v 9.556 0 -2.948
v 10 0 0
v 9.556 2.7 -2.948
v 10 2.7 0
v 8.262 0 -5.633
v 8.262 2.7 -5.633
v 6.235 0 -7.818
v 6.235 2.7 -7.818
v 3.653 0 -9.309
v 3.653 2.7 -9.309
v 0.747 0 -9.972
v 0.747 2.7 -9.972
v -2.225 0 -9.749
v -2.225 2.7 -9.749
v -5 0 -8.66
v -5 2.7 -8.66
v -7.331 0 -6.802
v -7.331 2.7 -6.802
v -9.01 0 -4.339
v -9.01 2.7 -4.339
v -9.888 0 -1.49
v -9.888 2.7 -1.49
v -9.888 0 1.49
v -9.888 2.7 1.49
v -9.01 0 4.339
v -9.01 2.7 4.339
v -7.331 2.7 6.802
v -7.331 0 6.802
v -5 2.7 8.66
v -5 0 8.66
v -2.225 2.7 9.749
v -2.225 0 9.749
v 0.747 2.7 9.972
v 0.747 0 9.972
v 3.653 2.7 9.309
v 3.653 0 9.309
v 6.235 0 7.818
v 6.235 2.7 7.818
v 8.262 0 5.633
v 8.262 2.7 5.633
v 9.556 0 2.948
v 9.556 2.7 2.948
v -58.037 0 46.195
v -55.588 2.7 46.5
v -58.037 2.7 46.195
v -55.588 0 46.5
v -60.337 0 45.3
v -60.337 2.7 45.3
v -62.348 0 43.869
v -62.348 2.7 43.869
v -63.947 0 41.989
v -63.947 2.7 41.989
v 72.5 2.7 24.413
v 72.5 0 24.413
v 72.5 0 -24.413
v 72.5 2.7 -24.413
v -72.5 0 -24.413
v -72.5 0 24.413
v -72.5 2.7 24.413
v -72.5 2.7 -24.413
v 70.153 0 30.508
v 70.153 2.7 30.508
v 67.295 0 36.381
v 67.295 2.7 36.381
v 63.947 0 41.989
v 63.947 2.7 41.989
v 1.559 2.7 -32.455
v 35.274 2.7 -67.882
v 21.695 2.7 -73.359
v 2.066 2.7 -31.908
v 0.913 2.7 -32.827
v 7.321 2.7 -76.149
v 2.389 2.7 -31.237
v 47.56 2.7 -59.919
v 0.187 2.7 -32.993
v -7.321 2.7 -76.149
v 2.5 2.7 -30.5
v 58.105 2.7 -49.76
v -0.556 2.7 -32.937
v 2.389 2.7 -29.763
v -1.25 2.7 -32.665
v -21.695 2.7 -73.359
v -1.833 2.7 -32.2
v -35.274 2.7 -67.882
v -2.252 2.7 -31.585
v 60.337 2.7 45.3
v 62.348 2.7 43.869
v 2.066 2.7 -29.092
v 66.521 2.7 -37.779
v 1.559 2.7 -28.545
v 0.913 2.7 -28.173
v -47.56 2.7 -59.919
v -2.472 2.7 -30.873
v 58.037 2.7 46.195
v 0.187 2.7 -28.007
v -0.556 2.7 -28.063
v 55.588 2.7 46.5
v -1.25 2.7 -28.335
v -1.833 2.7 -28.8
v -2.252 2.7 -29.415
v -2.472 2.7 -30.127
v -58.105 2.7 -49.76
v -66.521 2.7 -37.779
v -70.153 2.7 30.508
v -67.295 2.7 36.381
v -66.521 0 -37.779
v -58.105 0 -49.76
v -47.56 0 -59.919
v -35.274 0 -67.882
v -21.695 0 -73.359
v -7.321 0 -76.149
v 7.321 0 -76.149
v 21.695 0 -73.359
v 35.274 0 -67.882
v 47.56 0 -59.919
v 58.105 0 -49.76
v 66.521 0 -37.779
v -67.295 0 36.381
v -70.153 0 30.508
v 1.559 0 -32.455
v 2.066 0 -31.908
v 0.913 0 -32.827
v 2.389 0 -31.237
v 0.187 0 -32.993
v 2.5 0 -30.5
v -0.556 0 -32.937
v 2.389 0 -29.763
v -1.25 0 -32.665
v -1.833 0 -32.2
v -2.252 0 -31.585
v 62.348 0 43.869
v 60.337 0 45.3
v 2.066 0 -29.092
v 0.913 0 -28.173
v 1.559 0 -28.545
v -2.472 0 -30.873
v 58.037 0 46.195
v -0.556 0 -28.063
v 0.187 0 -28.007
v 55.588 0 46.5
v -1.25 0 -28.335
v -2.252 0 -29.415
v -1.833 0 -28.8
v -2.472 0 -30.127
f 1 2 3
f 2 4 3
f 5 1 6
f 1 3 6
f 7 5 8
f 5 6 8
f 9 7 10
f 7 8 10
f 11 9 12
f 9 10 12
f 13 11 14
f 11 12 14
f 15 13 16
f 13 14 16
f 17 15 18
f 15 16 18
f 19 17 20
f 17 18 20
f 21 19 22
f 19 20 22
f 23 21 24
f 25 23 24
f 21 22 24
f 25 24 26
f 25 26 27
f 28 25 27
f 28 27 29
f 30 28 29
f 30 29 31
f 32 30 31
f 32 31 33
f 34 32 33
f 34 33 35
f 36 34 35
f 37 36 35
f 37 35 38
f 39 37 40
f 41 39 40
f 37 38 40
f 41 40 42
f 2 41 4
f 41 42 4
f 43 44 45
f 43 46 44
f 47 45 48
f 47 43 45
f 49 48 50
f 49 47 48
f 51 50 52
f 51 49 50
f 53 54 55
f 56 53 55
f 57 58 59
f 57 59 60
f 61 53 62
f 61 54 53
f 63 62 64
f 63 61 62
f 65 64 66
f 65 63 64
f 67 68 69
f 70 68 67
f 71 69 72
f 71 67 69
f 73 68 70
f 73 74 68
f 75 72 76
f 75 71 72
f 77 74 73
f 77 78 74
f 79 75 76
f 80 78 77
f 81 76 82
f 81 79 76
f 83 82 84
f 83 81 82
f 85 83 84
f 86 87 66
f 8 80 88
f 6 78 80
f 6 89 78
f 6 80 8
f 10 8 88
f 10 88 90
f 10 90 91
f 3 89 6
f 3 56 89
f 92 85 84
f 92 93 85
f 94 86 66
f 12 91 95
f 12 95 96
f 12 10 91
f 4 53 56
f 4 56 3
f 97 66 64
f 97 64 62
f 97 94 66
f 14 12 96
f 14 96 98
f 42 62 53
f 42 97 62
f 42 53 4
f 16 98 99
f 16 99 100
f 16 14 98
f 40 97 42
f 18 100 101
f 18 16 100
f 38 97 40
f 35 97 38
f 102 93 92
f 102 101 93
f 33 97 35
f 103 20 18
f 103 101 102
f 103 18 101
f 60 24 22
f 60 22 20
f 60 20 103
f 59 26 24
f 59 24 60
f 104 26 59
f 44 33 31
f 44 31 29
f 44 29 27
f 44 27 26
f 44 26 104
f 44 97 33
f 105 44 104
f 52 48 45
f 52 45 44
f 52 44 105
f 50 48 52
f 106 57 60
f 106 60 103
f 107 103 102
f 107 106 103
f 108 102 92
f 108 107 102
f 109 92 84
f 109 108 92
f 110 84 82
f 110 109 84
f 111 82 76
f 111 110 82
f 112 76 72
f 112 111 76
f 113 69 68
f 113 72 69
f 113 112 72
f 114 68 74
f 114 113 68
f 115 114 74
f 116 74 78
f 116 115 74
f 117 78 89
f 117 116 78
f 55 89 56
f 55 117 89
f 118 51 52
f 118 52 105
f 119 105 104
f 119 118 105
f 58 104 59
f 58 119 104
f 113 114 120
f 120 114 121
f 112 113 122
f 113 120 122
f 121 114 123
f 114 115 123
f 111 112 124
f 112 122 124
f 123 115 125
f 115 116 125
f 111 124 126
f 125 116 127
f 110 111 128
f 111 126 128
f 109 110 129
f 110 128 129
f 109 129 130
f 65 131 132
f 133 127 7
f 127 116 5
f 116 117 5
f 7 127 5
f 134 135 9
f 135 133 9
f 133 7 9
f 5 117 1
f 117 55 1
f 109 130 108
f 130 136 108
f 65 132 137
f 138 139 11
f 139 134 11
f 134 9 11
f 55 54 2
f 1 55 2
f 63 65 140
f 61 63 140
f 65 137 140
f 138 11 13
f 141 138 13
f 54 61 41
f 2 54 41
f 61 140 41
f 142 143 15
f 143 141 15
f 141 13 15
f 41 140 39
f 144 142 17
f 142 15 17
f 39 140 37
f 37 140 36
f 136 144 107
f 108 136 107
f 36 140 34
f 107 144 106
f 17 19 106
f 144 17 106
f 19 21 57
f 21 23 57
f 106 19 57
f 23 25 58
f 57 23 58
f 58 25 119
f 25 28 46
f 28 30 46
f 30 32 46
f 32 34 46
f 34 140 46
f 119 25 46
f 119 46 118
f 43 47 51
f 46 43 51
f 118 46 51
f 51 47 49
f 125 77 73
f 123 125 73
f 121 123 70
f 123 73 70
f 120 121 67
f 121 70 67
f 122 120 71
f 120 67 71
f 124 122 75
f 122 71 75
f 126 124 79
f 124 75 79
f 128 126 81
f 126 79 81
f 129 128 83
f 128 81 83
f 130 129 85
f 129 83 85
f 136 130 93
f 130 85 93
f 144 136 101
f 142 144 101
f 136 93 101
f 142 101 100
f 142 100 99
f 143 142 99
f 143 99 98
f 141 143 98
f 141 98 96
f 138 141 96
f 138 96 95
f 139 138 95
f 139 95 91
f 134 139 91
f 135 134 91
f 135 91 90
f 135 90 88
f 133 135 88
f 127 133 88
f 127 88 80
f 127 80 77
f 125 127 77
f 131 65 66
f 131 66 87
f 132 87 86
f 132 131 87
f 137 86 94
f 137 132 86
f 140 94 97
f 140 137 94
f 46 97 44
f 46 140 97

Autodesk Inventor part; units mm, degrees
ref_plane "YZ Plane" through (0, 0, 0) normal (1, 0, 0) x (0, 1, 0)
ref_plane "XZ Plane" through (0, 0, 0) normal (0, 1, 0) x (-1, 0, 0)
ref_plane "XY Plane" through (0, 0, 0) normal (0, 0, 1) x (1, 0, 0)
sketch "Sketch3" plane through (0, 0, 0) normal (0, 1, 0) x (-1, 0, 0)
  line L0 (0, 0) -> (72.5, 0)
  line L1 (0, 0) -> (0, 46.5)
  line L2 (72.5, 24.4131) -> (72.5, -24.4131)
  line L3 (0, 46.5) -> (55.5878, 46.5)
  line L4 (-72.5, 24.4131) -> (-72.5, -24.4131)
  line L5 (0, 46.5) -> (-55.5878, 46.5)
  arc A0 (72.5, 24.4131) -> (63.9468, 41.9887) centre (0, 0) ccw
  arc A1 (-63.9468, 41.9887) -> (-72.5, 24.4131) centre (0, 0) ccw
  arc A2 (-72.5, -24.4131) -> (72.5, -24.4131) centre (0, 0) ccw
  arc A3 (63.9468, 41.9887) -> (55.5878, 46.5) centre (55.5878, 36.5) ccw
  arc A4 (-55.5878, 46.5) -> (-63.9468, 41.9887) centre (-55.5878, 36.5) ccw
  point P0 (60.7454, 46.5)
  point P1 (-60.7454, 46.5)
  dimension "d28" = 72.5
  dimension "d29" = 46.5
  dimension "d30" = 10
  dimension "d31" = 10
  dimension "d32" = 76.5
  dimension "d34" = 72.5
  dimension "d35" = 76.5
extrude "Extrusion2" add sketch "Sketch3" along normal blind 2.7
sketch "Sketch4" plane through (0, 2.7, 0) normal (0, 1, 0) x (1, 0, 0)
  line L0 (-55.5878, -46.5) -> (55.5878, -46.5) projected
  line L1 (0, -46.5) -> (0, 0)
  circle A0 centre (0, 0) radius 10
  arc A1 (72.5, 24.4131) -> (-72.5, 24.4131) centre (0, 0) ccw projected
  line L2 (0, 76.5) -> (0, 30.5)
  circle A2 centre (0, 30.5) radius 2.5
  dimension "d36" = 20
  dimension "d37" = 46
  dimension "d38" = 5
extrude "Extrusion3" cut sketch "Sketch4" against normal blind 10
properties part number "tapa_carcasa_4.0"
